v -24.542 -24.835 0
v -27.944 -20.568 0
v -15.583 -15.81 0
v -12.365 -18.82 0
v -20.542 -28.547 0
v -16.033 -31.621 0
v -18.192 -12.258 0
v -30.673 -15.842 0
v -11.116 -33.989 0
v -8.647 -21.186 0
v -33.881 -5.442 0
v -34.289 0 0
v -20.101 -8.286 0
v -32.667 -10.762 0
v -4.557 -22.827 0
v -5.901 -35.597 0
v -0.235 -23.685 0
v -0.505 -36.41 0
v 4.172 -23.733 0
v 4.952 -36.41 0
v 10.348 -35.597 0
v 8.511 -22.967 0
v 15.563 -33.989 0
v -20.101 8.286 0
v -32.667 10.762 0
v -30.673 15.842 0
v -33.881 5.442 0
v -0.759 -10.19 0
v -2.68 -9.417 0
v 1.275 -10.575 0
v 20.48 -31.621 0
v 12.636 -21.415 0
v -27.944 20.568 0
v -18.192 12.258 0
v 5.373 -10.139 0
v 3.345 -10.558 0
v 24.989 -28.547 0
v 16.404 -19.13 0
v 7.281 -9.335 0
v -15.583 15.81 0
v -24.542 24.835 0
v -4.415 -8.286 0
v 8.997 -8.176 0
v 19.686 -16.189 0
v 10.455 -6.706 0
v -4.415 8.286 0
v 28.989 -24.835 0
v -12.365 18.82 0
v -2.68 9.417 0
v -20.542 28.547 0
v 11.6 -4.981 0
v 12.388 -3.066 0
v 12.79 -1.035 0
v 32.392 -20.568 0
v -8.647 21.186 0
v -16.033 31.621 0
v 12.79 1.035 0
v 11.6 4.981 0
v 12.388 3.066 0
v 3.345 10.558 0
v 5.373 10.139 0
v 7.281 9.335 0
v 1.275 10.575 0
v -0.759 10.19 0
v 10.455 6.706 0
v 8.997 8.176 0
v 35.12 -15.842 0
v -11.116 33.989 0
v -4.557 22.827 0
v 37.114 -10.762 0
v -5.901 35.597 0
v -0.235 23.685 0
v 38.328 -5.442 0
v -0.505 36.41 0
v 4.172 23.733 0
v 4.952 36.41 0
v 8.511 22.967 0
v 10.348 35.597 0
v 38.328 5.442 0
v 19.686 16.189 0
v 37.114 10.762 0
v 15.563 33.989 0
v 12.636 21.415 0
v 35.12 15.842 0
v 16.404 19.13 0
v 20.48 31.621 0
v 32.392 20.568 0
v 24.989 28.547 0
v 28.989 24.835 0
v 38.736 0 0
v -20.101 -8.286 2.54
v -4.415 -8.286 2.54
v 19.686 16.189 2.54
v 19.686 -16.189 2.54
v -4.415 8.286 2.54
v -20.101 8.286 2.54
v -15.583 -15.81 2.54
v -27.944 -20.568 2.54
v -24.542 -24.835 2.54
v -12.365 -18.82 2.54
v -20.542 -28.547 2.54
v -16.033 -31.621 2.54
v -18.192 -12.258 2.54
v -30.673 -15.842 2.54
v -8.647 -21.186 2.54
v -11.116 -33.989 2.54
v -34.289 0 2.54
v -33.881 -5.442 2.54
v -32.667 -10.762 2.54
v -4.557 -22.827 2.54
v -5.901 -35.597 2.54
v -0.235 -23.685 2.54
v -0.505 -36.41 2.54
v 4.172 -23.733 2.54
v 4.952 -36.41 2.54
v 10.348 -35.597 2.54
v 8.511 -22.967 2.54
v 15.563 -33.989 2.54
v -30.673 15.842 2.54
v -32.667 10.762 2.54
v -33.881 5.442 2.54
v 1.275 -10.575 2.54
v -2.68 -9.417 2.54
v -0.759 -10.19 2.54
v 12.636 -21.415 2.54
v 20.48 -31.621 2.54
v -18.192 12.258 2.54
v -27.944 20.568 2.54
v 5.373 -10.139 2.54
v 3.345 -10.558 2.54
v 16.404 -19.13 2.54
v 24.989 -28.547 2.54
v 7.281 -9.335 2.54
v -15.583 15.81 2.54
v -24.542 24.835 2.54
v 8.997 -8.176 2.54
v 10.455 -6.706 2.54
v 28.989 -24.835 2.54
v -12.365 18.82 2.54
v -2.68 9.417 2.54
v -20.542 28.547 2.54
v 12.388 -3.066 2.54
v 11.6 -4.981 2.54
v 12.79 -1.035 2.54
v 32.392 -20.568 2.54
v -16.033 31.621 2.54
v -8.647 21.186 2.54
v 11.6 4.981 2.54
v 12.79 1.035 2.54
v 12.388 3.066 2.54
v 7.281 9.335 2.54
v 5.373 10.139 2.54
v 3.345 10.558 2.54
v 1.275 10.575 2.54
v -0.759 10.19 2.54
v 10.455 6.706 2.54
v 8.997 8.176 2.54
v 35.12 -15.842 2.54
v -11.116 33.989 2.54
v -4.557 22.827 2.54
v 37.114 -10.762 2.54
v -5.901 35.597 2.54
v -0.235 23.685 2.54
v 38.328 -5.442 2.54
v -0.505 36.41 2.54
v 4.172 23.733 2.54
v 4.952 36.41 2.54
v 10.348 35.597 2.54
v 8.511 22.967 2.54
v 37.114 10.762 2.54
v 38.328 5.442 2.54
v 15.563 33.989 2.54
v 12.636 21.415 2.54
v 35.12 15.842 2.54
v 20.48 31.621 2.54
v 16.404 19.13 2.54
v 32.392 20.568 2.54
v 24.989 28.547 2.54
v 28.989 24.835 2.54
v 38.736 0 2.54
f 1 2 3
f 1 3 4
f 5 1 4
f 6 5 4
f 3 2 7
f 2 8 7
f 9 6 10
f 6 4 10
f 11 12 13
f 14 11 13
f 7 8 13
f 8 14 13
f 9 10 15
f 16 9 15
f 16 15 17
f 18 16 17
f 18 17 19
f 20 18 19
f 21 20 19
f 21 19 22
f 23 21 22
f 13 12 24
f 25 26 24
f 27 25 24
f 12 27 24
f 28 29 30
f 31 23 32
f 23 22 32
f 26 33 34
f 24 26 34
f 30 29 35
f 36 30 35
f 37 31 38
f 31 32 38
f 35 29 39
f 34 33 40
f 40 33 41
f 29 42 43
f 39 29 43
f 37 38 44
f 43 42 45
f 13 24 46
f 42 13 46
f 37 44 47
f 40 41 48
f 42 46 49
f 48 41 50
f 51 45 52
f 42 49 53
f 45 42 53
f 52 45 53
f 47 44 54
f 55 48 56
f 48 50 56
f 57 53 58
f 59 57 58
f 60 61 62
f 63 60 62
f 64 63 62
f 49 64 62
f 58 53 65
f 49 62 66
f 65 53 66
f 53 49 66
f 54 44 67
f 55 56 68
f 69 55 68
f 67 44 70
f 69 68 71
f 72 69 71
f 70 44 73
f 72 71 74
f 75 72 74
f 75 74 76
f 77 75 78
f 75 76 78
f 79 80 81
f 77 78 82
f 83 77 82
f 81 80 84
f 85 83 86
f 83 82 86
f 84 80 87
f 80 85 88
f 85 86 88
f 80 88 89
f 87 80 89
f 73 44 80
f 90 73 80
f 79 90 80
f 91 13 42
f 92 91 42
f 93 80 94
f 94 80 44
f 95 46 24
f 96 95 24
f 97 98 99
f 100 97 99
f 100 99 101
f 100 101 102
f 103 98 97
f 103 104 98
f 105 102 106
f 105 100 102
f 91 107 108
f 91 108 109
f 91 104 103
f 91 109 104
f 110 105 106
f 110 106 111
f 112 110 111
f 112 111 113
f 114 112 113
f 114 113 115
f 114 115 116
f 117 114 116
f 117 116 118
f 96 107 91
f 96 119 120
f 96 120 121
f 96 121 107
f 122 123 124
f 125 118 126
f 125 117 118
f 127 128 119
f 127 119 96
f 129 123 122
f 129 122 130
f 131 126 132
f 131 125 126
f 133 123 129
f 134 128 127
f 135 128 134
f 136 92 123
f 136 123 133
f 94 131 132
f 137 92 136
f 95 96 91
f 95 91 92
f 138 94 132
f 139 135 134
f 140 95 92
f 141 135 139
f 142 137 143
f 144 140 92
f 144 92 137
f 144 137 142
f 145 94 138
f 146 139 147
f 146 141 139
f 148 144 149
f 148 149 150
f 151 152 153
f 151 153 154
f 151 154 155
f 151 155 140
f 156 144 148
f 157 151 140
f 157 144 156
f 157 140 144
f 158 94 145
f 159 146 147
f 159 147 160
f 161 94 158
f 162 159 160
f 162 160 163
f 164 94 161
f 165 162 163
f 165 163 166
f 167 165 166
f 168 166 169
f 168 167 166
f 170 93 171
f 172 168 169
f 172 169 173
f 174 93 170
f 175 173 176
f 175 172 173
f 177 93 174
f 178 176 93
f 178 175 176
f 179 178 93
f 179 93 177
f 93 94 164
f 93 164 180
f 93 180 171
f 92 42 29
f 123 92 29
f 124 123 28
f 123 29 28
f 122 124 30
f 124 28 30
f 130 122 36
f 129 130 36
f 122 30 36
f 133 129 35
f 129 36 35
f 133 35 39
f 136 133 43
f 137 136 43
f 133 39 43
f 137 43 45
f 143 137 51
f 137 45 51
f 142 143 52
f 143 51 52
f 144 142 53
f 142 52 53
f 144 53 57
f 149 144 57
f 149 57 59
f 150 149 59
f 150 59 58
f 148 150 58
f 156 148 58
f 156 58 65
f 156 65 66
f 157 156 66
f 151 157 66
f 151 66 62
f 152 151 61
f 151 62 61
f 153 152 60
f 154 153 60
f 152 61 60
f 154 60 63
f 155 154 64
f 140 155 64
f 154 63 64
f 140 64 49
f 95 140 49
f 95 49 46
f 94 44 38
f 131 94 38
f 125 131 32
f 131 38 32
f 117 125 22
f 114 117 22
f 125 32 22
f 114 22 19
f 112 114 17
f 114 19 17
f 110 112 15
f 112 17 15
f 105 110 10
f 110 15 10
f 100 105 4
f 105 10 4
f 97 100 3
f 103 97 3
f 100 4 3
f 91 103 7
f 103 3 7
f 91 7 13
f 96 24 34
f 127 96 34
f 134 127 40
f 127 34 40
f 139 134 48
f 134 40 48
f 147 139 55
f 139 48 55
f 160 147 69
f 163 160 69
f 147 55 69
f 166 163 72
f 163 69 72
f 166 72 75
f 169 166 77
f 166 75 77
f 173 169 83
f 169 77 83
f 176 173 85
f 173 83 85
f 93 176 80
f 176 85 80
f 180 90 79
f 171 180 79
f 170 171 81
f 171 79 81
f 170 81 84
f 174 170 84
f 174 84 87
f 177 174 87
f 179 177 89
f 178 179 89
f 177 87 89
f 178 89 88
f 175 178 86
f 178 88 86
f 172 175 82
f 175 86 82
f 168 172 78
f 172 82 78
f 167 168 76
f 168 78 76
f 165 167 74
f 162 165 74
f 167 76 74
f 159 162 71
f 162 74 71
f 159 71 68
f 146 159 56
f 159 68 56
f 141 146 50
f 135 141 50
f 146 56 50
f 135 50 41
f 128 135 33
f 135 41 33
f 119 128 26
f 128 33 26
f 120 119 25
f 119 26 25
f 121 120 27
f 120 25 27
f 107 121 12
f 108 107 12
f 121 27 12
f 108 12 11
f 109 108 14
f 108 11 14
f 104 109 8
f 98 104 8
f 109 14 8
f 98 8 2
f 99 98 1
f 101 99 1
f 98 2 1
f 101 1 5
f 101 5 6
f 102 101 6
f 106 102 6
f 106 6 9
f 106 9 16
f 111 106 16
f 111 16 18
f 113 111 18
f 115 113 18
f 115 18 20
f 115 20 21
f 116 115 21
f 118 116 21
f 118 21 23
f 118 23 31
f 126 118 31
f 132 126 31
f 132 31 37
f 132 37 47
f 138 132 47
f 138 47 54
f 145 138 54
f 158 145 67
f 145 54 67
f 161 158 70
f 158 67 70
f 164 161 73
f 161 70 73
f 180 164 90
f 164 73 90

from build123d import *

# Parameters (mm, degrees)
F0_R     = 36.5125
F1_DEPTH = 2.54


with BuildPart() as f1:
    # F0 (on Top) → F1 (new body)
    with BuildSketch(Plane.XY):
        with Locations((2.223555, 0)):
            Circle(F0_R)
        with BuildLine():
            Line((19.686055, 16.189387), (19.686055, -16.189387))
            ThreePointArc((19.686055, -16.189387), (-2.415954, -23.356158), (-20.100791, -8.286056))
            Line((-20.100791, -8.286056), (-4.414684, -8.286056))
            ThreePointArc((-4.414684, -8.286056), (12.840755, 0), (-4.414684, 8.286056))
            Line((-4.414684, 8.286056), (-20.100791, 8.286056))
            ThreePointArc((-20.100791, 8.286056), (-2.415954, 23.356158), (19.686055, 16.189387))
        make_face(mode=Mode.SUBTRACT)
    extrude(amount=F1_DEPTH)


solid = f1.part
